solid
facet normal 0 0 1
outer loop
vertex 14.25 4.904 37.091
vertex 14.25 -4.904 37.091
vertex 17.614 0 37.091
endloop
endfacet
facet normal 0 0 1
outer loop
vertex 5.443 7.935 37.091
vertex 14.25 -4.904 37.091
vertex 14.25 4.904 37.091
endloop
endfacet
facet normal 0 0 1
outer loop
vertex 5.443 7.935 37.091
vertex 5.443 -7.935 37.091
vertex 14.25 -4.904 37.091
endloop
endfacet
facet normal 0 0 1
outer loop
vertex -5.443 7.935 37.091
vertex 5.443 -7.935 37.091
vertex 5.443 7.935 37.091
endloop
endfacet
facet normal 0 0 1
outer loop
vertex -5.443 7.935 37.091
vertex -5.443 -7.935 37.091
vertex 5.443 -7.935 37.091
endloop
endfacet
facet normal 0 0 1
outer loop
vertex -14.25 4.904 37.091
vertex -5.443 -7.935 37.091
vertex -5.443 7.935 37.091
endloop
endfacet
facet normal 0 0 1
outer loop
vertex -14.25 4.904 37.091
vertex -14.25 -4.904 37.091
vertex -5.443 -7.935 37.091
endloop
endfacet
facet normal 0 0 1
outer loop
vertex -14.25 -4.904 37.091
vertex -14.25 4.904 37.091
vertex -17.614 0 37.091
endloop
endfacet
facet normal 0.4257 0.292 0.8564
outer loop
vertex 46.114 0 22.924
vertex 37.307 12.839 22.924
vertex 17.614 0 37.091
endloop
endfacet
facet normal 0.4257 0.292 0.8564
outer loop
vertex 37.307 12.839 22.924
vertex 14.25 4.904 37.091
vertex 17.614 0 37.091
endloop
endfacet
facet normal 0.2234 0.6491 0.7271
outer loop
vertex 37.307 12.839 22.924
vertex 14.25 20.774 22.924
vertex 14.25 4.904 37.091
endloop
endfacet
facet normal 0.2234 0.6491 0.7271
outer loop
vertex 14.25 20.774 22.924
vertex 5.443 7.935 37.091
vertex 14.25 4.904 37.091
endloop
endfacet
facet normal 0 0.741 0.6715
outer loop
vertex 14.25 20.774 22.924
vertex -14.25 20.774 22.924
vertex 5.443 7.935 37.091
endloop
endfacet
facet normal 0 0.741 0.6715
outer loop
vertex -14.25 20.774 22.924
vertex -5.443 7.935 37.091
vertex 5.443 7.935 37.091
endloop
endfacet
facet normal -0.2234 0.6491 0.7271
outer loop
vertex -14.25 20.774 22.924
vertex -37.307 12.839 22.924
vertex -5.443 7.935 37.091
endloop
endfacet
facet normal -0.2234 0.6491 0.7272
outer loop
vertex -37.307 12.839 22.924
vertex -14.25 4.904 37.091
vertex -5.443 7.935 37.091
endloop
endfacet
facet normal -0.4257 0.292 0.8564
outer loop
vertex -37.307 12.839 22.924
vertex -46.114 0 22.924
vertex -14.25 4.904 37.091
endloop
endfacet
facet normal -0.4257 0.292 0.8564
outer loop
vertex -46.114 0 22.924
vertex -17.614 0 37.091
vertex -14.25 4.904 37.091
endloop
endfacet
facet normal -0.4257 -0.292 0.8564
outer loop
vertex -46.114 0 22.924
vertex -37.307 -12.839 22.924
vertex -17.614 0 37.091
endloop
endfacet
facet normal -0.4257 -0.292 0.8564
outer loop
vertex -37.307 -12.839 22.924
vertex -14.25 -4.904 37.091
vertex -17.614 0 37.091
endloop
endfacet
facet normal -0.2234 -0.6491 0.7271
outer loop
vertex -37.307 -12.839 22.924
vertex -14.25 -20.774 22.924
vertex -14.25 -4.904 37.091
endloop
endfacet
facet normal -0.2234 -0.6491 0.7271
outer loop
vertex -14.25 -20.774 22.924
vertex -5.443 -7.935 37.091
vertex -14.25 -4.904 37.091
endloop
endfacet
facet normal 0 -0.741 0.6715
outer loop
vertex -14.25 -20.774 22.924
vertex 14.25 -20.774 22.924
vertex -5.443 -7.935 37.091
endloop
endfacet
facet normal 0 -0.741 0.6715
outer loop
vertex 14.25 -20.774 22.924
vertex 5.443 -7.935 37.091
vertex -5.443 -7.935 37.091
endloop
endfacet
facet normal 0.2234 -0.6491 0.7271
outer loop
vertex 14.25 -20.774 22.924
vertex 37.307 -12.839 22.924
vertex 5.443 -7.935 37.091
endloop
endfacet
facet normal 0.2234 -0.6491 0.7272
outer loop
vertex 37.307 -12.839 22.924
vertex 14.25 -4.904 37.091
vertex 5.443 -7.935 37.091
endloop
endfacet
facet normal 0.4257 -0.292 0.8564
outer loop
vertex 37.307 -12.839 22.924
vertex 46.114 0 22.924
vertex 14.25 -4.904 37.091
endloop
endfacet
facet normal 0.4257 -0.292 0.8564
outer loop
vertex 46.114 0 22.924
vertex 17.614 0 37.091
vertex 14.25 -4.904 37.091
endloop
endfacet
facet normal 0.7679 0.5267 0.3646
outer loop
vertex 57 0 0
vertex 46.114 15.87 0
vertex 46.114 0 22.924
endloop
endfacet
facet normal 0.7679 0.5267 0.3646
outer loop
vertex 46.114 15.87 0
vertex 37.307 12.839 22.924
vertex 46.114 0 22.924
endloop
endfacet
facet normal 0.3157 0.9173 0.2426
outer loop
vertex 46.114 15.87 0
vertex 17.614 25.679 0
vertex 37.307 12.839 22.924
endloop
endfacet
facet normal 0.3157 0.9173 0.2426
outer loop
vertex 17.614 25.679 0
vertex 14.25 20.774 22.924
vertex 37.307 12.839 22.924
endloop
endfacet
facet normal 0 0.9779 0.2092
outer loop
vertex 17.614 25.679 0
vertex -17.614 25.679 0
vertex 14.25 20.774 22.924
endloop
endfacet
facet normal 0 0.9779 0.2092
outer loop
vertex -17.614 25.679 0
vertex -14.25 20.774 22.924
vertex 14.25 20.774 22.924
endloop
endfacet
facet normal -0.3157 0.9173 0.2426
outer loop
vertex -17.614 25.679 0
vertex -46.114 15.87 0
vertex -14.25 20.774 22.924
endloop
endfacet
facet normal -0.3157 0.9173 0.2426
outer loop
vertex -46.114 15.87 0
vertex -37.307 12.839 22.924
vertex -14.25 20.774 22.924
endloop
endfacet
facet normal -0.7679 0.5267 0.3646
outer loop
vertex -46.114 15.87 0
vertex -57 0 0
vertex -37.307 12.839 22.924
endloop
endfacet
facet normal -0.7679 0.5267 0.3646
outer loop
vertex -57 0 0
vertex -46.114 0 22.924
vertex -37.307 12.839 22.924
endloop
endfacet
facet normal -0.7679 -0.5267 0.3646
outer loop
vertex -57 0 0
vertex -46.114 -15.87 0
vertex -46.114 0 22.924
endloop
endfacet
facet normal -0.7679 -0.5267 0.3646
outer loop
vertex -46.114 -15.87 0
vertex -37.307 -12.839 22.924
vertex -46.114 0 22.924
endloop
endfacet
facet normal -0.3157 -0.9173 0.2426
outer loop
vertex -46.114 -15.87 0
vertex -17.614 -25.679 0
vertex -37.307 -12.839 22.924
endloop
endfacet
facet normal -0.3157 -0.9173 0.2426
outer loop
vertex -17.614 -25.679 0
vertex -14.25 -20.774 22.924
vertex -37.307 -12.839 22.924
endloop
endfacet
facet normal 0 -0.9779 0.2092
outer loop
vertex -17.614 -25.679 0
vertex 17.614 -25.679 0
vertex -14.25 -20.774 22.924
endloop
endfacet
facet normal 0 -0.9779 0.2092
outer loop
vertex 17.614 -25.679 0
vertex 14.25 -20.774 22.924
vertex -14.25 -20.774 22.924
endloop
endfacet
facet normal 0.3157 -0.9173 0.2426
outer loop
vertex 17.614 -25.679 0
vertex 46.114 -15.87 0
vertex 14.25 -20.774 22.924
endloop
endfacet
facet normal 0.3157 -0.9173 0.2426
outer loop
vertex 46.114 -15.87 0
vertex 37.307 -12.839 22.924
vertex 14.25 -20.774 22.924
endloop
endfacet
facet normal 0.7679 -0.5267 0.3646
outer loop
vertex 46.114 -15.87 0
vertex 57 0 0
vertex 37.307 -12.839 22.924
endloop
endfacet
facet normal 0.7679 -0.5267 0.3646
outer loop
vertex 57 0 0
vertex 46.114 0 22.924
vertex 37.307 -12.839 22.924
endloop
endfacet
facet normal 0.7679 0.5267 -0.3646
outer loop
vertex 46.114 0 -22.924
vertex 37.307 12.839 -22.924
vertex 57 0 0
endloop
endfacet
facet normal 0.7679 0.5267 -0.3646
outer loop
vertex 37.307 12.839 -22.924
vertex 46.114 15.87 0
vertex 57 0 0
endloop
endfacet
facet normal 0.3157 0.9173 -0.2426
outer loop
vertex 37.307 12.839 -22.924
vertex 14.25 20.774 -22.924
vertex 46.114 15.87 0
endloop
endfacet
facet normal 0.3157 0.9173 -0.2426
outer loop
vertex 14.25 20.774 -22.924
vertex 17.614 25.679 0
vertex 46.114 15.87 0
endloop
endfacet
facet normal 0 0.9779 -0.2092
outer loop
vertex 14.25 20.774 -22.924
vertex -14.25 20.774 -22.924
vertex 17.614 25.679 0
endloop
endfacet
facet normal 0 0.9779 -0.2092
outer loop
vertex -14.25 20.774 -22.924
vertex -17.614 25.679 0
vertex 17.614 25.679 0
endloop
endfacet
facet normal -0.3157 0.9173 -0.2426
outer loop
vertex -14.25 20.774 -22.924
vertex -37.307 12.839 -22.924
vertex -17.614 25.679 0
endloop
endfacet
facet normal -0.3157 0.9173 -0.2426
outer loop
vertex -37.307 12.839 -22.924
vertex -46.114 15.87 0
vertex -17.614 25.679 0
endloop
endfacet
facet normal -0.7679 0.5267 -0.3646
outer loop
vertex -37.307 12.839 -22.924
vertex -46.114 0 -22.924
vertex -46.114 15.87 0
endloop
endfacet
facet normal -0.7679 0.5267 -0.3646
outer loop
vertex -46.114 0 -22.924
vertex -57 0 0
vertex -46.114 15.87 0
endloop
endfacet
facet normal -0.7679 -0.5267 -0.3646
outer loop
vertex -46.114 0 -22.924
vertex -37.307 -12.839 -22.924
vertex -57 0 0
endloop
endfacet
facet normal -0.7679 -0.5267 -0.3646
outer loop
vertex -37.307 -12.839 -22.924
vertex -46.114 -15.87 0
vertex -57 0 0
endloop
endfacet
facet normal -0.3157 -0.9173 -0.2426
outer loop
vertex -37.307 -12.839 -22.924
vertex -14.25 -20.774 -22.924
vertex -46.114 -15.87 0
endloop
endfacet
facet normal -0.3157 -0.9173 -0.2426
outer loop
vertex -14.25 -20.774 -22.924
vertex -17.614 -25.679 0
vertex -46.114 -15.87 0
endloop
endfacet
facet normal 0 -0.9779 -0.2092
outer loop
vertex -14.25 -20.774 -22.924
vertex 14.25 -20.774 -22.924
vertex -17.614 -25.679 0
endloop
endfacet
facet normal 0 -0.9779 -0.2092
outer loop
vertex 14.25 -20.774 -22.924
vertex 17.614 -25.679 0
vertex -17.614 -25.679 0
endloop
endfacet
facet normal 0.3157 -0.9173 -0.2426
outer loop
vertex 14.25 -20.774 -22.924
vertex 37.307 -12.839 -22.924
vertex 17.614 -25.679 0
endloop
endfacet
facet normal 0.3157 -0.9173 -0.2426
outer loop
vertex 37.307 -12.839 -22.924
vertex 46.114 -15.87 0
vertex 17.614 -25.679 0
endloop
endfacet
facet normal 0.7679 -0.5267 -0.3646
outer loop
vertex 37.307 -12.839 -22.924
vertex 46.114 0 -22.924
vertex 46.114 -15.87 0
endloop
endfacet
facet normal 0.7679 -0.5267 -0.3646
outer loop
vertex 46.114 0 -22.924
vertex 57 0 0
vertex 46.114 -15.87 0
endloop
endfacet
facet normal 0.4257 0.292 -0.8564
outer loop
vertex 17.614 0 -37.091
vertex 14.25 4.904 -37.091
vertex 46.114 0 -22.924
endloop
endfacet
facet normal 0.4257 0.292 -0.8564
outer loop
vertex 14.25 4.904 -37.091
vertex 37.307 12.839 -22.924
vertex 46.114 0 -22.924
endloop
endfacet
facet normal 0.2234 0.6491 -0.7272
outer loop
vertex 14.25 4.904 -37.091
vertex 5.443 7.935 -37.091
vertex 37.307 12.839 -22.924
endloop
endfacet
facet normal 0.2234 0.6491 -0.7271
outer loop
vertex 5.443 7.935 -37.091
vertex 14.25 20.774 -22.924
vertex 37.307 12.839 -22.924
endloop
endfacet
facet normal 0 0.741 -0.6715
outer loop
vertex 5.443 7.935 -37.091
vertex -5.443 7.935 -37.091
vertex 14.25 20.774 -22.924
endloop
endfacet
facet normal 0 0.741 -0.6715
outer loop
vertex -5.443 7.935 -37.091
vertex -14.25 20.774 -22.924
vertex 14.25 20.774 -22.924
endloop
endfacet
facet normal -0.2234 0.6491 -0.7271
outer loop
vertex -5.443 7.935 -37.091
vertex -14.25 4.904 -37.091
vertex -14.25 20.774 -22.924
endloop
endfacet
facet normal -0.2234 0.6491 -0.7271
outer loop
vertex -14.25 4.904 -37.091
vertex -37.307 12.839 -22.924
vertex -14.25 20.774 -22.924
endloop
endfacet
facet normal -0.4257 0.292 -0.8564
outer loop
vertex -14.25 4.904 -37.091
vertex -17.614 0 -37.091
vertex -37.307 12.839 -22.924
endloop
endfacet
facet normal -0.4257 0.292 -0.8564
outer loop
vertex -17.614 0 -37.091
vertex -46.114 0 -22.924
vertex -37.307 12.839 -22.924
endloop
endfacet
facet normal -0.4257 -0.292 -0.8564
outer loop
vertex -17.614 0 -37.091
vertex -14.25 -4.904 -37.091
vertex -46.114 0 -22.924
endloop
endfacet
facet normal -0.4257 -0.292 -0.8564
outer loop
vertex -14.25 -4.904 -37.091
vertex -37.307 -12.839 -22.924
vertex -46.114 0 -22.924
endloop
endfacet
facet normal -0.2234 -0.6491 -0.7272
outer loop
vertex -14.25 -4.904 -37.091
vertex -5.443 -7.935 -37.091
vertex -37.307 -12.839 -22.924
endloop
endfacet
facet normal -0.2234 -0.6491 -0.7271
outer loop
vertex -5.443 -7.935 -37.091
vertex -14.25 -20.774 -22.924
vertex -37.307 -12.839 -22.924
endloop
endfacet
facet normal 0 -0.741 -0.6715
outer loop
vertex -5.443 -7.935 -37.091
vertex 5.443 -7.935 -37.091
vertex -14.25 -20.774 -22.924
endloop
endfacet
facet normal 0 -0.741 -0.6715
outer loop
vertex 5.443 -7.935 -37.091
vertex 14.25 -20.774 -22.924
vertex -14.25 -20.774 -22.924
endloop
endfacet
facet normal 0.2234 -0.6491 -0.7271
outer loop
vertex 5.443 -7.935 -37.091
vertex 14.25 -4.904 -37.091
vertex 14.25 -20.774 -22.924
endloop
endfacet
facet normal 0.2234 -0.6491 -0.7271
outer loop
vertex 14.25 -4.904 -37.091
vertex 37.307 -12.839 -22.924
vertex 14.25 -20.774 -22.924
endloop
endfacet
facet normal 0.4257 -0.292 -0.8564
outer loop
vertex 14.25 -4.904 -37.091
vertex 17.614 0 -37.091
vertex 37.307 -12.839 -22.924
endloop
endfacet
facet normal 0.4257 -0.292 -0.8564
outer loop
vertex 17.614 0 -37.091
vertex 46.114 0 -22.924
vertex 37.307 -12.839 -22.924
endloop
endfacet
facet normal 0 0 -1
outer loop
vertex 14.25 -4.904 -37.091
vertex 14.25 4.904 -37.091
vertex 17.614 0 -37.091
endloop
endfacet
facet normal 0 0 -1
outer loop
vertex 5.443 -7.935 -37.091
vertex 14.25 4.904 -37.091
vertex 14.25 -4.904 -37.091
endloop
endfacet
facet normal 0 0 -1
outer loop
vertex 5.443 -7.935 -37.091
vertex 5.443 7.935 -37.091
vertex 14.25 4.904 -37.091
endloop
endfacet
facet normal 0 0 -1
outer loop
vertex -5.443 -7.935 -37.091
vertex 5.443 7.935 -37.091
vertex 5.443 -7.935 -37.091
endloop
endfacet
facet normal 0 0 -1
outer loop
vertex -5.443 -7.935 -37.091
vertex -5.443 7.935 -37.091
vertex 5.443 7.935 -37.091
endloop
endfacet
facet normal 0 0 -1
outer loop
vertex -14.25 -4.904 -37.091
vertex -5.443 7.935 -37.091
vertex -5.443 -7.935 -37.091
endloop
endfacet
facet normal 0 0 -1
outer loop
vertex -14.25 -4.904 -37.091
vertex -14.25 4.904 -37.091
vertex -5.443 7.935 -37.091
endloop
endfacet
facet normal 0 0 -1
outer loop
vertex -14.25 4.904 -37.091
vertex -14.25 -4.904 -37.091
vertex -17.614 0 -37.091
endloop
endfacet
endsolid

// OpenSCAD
// Generated by SolidPython 1.0.1 on 2020-07-29 00:46:54


scale(v = [19, 9, 13]) {
	sphere(r = 3);
}
/***********************************************
*********      SolidPython code:      **********
************************************************
 
# import packages: SolidPython
from solid import *
from solid.utils import *
from itertools import chain, combinations, permutations


class Resize:

    def __init__(self, scad_file):
        self.scad_file = scad_file
        #self.scad_file = import_scad(scad_file)
        # cone/cylinder param:
        self.r1 = 0
        self.r2 = 0
        self.h = 0
        # rectangular prism param:
        self.w = 0
        self.l = 0
        # ellipse param:
        self.r = 0

    # import OpenScad code (file name corresponds to shape)


    # classify shape + parameters
    def assign(self, param1, param2, param3):
        if self.scad_file == 'cone.scad':
            self.r1 = param1
            self.r2 = param2
            self.h = param3
        elif self.scad_file == 'cylinder.scad':
            self.r1 = param1
            self.r2 = param2
            self.h = param3
        elif self.scad_file == 'rectangularPrism.scad':
            self.h = param1
            self.l = param2
            self.w = param3
        else:
            self.r = param1
            self.h = param2

    # resize parameters
    def iterate(self):
        x = range(3, 20, 2)
        i = 1
        if self.scad_file == 'cone.scad':
            tempList = list(permutations(x, 2))
            for temp in tempList:
                param1 = temp[0]
                param2 = temp[1]
                filepath = 'produced_scad_files/' + 'cone' + str(param1) + '_' + str(param2) + '_' + '.scad'
                scad_render_to_file(cylinder(h=param1, r1=param2, r2=0), filepath)

        elif self.scad_file == 'cylinder.scad':
            tempList = list(permutations(x, 3))
            for temp in tempList:
                param1 = temp[0]
                param2 = temp[1]
                filepath = 'produced_scad_files/' + 'cylinder' + str(param1) + '_' + str(param2) + '_' + '.scad'
                scad_render_to_file(cylinder(h=param1, r1=param2, r2=param2), filepath)

        elif self.scad_file == 'rectangularPrism.scad':
            tempList = list(permutations(x, 3))
            for temp in tempList:
                param1 = temp[0]
                param2 = temp[1]
                param3 = temp[2]
                filepath = 'produced_scad_files/' + 'rectangularPrism' + str(param1) + '_' + str(param2) + '_' + str(
                    param3) + '.scad'
                scad_render_to_file(cube(size=(param1, param2, param3)), filepath)

        elif self.scad_file == 'ellipse.scad':
            tempList = list(permutations(x, 4))
            for temp in tempList:
                param1 = temp[0]
                param2 = temp[1]
                param3 = temp[2]
                param4 = temp[3]
                filepath = 'produced_scad_files/' + 'ellipse' + str(param1) + '_' + str(param2) + '_' + str(param3) + '_' + str(param4) + '.scad'
                scad_render_to_file(scale([param1, param2, param3])(sphere(r=param4)), filepath)

    def render_to_scadfile(self):
        scad_render_to_file(scad, 'example.scad') 
 
************************************************/
